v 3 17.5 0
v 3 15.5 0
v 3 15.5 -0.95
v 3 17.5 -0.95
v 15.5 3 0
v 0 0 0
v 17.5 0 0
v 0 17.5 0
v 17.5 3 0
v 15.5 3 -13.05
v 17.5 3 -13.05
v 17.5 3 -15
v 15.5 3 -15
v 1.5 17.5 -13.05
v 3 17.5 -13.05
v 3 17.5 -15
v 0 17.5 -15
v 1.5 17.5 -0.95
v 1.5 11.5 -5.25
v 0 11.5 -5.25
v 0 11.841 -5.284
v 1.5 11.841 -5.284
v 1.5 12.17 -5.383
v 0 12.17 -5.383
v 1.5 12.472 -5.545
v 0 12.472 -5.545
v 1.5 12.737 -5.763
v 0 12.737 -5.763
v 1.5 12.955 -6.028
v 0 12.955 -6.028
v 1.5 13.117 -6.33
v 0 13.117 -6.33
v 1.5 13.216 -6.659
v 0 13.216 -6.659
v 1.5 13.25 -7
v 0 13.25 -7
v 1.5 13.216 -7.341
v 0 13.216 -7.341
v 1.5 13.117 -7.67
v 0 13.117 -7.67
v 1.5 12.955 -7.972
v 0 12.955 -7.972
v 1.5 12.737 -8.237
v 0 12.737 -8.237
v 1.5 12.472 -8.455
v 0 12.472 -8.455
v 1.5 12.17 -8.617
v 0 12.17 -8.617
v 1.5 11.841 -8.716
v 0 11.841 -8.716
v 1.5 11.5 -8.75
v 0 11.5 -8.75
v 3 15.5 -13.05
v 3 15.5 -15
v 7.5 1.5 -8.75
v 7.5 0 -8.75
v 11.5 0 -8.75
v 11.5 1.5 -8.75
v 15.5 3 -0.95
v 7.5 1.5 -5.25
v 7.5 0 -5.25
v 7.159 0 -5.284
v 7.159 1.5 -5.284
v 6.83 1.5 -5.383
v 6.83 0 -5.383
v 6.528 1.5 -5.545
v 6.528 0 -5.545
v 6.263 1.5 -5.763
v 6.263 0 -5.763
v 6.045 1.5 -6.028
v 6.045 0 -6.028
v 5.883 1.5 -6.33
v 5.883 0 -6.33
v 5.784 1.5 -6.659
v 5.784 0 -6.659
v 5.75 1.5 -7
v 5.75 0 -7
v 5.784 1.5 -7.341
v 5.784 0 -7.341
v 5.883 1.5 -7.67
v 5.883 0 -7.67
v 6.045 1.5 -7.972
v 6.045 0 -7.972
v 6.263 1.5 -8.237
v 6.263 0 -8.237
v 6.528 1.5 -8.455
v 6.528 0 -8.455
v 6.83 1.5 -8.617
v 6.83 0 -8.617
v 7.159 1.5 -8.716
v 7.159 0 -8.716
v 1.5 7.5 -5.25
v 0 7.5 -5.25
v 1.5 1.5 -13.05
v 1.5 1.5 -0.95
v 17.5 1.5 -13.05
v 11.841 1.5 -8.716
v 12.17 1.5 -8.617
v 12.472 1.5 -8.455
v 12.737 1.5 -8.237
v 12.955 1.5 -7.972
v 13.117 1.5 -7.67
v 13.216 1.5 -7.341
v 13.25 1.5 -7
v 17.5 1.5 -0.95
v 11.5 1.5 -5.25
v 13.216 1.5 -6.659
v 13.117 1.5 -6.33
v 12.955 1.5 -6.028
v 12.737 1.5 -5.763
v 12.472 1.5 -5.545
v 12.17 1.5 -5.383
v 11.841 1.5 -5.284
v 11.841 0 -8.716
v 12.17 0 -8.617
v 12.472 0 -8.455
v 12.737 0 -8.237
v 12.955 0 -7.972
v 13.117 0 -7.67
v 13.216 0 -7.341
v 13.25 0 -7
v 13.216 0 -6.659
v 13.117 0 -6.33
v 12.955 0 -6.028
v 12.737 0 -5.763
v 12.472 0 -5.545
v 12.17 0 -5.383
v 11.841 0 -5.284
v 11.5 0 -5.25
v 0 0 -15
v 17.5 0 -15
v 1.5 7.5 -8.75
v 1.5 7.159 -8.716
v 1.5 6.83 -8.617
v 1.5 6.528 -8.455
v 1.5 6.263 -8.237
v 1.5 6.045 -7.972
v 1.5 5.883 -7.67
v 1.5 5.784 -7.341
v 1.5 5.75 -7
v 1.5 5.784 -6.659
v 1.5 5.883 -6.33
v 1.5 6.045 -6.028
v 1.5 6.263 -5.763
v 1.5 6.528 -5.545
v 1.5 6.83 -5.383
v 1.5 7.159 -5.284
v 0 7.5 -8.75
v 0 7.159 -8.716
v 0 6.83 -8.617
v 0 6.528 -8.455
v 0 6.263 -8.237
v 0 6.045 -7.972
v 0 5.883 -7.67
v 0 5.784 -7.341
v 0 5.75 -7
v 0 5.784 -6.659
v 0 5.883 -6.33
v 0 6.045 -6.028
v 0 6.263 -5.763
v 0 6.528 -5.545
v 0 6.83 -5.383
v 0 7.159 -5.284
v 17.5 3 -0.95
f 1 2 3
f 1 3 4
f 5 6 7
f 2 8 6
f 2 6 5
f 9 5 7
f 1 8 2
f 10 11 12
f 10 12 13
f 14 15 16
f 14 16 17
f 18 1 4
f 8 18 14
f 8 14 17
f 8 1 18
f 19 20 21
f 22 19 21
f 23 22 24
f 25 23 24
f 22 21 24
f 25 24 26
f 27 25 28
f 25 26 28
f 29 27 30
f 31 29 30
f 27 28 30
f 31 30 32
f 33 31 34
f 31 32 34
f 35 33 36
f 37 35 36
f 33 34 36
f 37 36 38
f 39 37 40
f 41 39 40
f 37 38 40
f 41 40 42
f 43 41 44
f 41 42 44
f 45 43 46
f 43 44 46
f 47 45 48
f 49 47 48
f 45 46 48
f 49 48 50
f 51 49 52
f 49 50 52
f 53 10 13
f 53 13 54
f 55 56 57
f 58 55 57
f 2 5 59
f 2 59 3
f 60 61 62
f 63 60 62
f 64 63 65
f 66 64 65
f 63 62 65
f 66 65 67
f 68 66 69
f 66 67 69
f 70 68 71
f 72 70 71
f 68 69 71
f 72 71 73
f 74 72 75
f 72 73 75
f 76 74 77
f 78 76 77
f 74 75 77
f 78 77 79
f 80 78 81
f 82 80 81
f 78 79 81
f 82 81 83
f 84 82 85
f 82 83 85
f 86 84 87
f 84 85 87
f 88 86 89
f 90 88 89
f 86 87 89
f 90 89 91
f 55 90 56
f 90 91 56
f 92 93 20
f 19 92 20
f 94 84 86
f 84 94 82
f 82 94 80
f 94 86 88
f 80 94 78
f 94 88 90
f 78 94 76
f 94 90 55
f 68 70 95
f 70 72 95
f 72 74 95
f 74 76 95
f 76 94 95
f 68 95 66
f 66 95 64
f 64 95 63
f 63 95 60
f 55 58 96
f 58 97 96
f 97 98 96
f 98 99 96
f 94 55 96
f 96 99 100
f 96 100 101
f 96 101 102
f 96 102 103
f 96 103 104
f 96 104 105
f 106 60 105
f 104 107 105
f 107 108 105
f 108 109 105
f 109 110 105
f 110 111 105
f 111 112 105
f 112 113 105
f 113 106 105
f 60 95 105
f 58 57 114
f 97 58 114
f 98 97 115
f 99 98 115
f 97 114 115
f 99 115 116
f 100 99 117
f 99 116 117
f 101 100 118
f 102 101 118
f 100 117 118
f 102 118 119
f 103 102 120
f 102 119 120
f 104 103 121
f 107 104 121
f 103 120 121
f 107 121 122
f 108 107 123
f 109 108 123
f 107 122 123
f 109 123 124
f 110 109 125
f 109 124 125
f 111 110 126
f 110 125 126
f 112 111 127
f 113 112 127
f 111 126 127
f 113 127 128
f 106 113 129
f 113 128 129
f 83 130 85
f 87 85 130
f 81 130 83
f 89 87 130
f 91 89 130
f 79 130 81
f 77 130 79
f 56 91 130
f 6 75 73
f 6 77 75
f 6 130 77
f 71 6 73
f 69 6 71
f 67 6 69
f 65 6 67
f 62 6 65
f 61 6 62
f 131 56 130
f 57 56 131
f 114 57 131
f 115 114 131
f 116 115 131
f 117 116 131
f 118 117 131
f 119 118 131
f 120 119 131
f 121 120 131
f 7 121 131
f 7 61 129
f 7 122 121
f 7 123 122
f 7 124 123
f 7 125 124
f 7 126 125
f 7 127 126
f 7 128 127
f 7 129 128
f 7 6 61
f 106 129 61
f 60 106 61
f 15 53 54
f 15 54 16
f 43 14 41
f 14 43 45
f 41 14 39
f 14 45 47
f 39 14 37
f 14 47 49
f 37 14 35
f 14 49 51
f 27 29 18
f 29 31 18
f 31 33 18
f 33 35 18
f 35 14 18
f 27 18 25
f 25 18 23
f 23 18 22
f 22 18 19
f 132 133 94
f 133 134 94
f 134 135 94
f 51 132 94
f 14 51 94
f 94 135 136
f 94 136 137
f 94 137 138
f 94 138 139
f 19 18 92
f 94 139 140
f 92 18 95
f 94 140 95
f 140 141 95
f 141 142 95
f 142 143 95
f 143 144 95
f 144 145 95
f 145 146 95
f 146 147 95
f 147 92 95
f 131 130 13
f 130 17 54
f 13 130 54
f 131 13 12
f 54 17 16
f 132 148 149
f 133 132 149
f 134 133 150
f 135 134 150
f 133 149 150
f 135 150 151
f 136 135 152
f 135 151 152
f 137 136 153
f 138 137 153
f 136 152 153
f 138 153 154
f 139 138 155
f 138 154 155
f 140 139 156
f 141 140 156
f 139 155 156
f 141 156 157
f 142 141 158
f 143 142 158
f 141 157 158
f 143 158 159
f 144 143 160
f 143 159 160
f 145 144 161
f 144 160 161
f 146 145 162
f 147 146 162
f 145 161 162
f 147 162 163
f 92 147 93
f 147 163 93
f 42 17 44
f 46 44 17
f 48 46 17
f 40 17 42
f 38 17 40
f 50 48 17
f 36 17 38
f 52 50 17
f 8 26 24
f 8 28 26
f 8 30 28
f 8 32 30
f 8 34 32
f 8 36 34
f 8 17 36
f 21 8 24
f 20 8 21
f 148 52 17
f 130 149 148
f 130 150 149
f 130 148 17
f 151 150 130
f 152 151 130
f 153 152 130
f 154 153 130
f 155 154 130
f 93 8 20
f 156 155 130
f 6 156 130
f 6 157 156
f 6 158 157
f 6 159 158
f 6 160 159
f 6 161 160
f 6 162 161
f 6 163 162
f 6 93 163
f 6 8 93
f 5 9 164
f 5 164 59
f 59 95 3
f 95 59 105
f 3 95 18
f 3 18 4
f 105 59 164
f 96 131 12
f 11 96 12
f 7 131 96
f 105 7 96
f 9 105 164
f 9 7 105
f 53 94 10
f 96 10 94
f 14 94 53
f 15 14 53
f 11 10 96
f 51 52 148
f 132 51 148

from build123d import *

# Parameters (mm, degrees)
BOSS_EXTRUDE1_DEPTH     = 15
CUT_EXTRUDE1_START      = -7
CUT_EXTRUDE1_DEPTH      = 6.05
CUT_EXTRUDE2_DEPTH      = 29.057975693
CUT_EXTRUDE2_DEPTH_BACK = 29.057975693
CUT_EXTRUDE3_DEPTH      = 29.057975693
CUT_EXTRUDE3_DEPTH_BACK = 29.057975693


with BuildPart() as part:
    # Sketch1 → Boss-Extrude1 (new body)
    with BuildSketch(Plane.XY):
        Polygon((0, 17.5), (0, 0), (17.5, 0), (17.5, 3), (15.5, 3), (3, 15.5), (3, 17.5), align=None)
    extrude(amount=-BOSS_EXTRUDE1_DEPTH)

    # Sketch4 → Cut-Extrude1 (cut, symmetric)
    with BuildSketch(Plane.XY.offset(CUT_EXTRUDE1_START)):
        Polygon((1.5, 17.5), (1.5, 1.5), (17.5, 1.5), (17.5, 3), (3, 17.5), align=None)
    extrude(amount=CUT_EXTRUDE1_DEPTH, both=True, mode=Mode.SUBTRACT)

    # Sketch5 → Cut-Extrude2 (cut, two sides: drawn at the far end of the back side and taken through both)
    with BuildSketch(Plane(origin=(0, 1.5, 0), x_dir=(1, 0, 0), z_dir=(0, 1, 0)).offset(-CUT_EXTRUDE2_DEPTH_BACK)):
        with BuildLine():
            Line((7.5, 8.75), (11.5, 8.75))
            ThreePointArc((11.5, 8.75), (13.25, 7), (11.5, 5.25))
            Line((11.5, 5.25), (7.5, 5.25))
            ThreePointArc((7.5, 5.25), (5.75, 7), (7.5, 8.75))
        make_face()
    extrude(amount=CUT_EXTRUDE2_DEPTH + CUT_EXTRUDE2_DEPTH_BACK, mode=Mode.SUBTRACT)

    # Sketch6 → Cut-Extrude3 (cut, two sides: drawn at the far end of the back side and taken through both)
    with BuildSketch(Plane(origin=(1.5, 0, 0), x_dir=(0, 0, -1), z_dir=(1, 0, 0)).offset(-CUT_EXTRUDE3_DEPTH_BACK)):
        with BuildLine():
            Line((5.25, 7.5), (5.25, 11.5))
            ThreePointArc((5.25, 11.5), (7, 13.25), (8.75, 11.5))
            Line((8.75, 11.5), (8.75, 7.5))
            ThreePointArc((8.75, 7.5), (7, 5.75), (5.25, 7.5))
        make_face()
    extrude(amount=CUT_EXTRUDE3_DEPTH + CUT_EXTRUDE3_DEPTH_BACK, mode=Mode.SUBTRACT)


solid = part.part
